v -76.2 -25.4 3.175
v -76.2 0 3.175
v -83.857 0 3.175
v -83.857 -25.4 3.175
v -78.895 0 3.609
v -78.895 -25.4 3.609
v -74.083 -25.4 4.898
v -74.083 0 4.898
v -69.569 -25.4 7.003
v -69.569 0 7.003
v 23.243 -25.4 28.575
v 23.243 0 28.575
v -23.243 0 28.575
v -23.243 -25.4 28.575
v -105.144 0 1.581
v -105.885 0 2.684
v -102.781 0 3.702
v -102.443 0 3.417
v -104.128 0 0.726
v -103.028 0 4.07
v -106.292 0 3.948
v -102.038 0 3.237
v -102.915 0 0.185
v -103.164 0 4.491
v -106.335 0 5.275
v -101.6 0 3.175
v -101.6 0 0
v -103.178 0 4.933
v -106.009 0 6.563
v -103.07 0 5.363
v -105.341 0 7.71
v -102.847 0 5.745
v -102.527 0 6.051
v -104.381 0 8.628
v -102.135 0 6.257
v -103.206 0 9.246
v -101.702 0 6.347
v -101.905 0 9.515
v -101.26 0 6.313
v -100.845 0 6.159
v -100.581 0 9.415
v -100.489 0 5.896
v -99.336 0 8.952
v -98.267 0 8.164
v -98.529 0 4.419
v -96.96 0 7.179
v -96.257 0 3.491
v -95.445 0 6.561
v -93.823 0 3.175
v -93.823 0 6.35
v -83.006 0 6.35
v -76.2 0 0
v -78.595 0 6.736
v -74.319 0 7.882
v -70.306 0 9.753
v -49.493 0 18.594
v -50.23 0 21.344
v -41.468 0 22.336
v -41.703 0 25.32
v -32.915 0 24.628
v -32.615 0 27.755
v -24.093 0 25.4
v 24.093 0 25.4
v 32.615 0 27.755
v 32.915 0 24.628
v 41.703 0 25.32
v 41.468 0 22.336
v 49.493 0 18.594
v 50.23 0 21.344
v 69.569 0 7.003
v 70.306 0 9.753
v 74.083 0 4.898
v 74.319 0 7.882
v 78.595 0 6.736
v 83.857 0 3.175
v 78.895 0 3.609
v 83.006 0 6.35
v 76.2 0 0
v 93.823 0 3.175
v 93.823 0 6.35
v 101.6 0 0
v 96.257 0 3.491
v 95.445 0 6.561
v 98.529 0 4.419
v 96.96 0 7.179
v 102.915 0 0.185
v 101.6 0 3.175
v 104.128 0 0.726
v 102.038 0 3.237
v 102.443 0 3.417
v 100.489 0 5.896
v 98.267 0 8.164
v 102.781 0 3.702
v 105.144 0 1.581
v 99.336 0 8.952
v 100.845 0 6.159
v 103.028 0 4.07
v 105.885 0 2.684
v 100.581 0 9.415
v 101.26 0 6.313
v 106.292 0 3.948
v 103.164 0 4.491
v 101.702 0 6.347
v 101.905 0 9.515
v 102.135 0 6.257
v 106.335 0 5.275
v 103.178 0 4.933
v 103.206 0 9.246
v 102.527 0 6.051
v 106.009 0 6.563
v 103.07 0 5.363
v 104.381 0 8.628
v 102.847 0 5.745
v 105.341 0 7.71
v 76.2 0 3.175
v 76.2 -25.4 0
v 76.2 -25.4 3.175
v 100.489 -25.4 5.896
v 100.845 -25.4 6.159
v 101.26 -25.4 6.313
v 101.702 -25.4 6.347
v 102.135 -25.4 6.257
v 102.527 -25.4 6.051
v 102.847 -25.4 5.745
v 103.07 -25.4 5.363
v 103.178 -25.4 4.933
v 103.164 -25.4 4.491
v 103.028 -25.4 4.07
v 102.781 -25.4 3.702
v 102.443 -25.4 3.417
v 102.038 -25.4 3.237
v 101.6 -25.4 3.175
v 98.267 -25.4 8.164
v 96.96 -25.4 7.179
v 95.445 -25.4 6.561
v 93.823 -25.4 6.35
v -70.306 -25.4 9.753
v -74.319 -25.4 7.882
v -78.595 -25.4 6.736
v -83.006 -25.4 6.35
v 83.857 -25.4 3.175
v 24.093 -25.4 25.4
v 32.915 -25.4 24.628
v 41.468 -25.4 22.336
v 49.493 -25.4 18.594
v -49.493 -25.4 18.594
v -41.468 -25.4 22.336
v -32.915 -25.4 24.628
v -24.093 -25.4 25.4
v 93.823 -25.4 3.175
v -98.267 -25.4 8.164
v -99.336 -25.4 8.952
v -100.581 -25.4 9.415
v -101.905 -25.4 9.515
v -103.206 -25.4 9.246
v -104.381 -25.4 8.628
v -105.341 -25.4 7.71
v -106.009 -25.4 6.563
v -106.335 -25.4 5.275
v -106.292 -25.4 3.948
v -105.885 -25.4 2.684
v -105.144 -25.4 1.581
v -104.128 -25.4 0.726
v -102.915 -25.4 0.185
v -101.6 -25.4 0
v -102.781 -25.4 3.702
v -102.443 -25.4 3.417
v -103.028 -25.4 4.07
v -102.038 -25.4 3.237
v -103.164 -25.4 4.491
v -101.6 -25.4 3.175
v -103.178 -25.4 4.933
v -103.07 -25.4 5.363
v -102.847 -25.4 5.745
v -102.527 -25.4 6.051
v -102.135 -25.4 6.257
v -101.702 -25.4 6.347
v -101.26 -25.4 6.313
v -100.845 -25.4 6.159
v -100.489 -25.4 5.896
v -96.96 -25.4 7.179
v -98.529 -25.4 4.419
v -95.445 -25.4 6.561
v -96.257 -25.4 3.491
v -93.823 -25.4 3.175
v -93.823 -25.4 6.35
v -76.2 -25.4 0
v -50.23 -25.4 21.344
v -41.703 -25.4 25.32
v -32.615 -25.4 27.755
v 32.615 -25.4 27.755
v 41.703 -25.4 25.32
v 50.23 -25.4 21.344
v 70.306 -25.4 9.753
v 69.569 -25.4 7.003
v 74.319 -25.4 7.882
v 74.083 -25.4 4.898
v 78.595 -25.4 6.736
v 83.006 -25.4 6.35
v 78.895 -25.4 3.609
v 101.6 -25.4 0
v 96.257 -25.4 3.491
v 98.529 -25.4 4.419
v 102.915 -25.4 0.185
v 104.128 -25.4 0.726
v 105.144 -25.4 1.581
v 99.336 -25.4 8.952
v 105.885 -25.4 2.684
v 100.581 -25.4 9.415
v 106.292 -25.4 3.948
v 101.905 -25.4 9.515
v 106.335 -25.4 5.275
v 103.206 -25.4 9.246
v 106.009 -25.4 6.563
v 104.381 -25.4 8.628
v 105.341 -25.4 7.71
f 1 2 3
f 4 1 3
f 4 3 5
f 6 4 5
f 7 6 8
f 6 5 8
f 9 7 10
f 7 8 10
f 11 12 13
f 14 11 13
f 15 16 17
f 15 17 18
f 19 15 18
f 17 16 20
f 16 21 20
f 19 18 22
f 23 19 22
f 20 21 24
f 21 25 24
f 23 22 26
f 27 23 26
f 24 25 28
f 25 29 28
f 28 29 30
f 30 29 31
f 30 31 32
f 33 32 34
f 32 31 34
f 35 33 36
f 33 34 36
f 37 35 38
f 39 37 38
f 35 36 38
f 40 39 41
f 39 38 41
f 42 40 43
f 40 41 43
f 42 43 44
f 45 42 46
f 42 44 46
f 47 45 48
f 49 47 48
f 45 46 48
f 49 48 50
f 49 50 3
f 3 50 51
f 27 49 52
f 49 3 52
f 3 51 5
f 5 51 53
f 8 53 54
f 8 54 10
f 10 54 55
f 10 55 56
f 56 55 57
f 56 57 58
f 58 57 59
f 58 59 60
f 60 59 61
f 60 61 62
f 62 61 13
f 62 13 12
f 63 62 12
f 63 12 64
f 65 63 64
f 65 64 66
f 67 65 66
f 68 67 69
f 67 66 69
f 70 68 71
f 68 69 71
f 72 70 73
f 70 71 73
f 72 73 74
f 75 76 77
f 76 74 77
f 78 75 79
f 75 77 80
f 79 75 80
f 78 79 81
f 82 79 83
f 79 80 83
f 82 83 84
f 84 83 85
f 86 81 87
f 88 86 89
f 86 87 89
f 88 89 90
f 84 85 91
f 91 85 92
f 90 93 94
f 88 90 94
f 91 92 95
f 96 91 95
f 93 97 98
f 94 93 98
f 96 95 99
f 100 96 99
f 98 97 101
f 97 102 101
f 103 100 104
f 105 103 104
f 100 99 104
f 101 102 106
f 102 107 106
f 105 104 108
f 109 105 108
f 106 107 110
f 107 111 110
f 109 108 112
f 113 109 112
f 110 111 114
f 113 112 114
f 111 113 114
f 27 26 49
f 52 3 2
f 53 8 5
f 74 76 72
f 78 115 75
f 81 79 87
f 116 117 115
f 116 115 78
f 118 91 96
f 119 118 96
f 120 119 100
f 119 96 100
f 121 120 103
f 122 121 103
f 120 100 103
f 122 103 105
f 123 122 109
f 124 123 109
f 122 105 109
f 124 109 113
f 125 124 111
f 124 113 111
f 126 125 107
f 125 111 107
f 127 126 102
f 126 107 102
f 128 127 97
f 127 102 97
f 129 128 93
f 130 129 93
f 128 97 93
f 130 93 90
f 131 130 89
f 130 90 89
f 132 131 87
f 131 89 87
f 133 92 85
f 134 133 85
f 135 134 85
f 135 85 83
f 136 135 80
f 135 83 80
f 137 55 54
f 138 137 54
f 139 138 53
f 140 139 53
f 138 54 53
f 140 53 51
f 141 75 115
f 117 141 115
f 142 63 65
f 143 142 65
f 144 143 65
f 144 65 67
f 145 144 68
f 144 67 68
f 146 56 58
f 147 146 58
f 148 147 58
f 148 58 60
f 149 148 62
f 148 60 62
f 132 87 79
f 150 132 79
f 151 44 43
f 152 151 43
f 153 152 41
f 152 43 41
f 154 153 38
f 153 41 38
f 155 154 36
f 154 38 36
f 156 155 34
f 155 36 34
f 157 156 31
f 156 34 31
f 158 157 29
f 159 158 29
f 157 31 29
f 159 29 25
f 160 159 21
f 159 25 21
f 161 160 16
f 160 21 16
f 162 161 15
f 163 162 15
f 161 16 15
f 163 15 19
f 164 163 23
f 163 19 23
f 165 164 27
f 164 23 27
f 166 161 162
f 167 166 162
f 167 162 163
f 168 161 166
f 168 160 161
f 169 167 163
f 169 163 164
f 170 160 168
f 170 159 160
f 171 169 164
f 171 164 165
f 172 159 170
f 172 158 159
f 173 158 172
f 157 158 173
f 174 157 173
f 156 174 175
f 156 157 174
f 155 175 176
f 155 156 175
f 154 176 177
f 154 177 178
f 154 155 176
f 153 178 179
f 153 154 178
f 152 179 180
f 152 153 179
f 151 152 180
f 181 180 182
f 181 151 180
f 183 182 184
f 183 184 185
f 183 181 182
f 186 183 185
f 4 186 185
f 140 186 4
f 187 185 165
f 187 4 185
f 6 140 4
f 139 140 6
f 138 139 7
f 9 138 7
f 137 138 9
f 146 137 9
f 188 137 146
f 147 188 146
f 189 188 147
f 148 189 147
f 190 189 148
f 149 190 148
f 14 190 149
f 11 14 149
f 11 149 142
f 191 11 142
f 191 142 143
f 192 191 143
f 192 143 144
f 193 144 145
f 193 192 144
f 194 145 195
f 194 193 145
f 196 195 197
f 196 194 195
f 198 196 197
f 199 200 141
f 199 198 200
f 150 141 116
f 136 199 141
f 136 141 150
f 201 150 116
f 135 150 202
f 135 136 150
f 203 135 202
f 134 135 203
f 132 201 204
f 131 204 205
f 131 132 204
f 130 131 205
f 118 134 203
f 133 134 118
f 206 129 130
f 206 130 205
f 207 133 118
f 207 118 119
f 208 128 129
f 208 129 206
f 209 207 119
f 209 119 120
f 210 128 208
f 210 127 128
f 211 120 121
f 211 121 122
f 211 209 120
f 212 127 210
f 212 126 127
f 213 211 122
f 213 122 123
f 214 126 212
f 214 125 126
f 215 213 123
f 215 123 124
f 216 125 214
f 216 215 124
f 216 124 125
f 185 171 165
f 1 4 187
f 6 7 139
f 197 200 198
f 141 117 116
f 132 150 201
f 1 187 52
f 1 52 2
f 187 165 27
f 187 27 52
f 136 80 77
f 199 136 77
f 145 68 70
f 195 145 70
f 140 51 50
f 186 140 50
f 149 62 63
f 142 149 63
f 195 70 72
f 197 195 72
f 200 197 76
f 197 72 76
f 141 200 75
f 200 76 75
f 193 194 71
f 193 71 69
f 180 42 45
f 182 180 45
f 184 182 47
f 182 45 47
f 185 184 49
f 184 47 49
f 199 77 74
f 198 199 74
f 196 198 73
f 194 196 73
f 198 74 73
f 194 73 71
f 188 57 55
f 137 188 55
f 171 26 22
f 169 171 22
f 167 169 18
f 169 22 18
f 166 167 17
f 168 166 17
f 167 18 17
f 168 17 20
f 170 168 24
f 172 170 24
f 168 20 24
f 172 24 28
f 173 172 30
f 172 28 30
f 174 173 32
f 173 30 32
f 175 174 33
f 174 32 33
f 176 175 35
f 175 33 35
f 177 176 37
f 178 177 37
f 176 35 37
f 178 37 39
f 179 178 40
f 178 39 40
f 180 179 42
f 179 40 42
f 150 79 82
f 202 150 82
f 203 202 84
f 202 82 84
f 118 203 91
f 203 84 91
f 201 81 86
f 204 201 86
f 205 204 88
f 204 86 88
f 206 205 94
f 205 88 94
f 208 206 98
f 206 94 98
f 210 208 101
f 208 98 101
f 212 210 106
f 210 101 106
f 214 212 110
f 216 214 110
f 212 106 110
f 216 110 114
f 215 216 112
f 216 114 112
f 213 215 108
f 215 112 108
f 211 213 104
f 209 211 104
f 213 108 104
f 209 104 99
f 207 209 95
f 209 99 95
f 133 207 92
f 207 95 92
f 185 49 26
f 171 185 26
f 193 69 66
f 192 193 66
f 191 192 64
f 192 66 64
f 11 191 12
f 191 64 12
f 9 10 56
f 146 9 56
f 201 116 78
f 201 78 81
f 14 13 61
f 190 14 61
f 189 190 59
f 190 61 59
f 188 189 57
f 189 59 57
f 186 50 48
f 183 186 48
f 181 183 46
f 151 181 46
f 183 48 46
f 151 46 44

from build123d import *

# Parameters (mm, degrees)
F1_DEPTH = 25.4


with BuildPart() as f1:
    # F0 (on Front) → F1 (new body)
    with BuildSketch(Plane.XZ):
        with BuildLine():
            Line((-101.6, 0), (-76.2, 0))
            Line((-76.2, 0), (-76.2, 3.175))
            Line((-76.2, 3.175), (-83.856648, 3.175))
            ThreePointArc((-83.856648, 3.175), (-76.460894, 4.14867), (-69.569148, 7.003324))
            Line((-69.569148, 7.003324), (-49.493352, 18.594091))
            ThreePointArc((-49.493352, 18.594091), (-37.241359, 23.669032), (-24.093352, 25.4))
            Line((-24.093352, 25.4), (0, 25.4))
            Line((0, 25.4), (0, 28.575))
            Line((0, 28.575), (-23.242613, 28.575))
            ThreePointArc((-23.242613, 28.575), (-37.212371, 26.735846), (-50.230113, 21.343721))
            Line((-50.230113, 21.343721), (-70.305909, 9.752955))
            ThreePointArc((-70.305909, 9.752955), (-76.431906, 7.215484), (-83.005909, 6.35))
            Line((-83.005909, 6.35), (-93.82287, 6.35))
            ThreePointArc((-93.82287, 6.35), (-96.222944, 6.821042), (-98.266944, 8.164286))
            ThreePointArc((-98.266944, 8.164286), (-106.009218, 6.562556), (-101.6, 0))
        make_face()
        with BuildLine():
            ThreePointArc((-100.488981, 5.896429), (-97.422982, 3.881564), (-93.82287, 3.175))
            Line((-93.82287, 3.175), (-101.6, 3.175))
            ThreePointArc((-101.6, 3.175), (-103.069739, 5.362519), (-100.488981, 5.896429))
        make_face(mode=Mode.SUBTRACT)
        with BuildLine():
            Line((0, 28.575), (0, 25.4))
            Line((0, 25.4), (24.093352, 25.4))
            ThreePointArc((24.093352, 25.4), (37.241359, 23.669032), (49.493352, 18.594091))
            Line((49.493352, 18.594091), (69.569148, 7.003324))
            ThreePointArc((69.569148, 7.003324), (76.460894, 4.14867), (83.856648, 3.175))
            Line((83.856648, 3.175), (76.2, 3.175))
            Line((76.2, 3.175), (76.2, 0))
            Line((76.2, 0), (101.6, 0))
            ThreePointArc((101.6, 0), (106.009218, 6.562556), (98.266944, 8.164286))
            ThreePointArc((98.266944, 8.164286), (96.222944, 6.821042), (93.82287, 6.35))
            Line((93.82287, 6.35), (83.005909, 6.35))
            ThreePointArc((83.005909, 6.35), (76.431906, 7.215484), (70.305909, 9.752955))
            Line((70.305909, 9.752955), (50.230113, 21.343721))
            ThreePointArc((50.230113, 21.343721), (37.212371, 26.735846), (23.242613, 28.575))
            Line((23.242613, 28.575), (0, 28.575))
        make_face()
        with BuildLine():
            Line((101.6, 3.175), (93.82287, 3.175))
            ThreePointArc((93.82287, 3.175), (97.422982, 3.881564), (100.488981, 5.896429))
            ThreePointArc((100.488981, 5.896429), (103.069739, 5.362519), (101.6, 3.175))
        make_face(mode=Mode.SUBTRACT)
    extrude(amount=F1_DEPTH)


solid = f1.part
